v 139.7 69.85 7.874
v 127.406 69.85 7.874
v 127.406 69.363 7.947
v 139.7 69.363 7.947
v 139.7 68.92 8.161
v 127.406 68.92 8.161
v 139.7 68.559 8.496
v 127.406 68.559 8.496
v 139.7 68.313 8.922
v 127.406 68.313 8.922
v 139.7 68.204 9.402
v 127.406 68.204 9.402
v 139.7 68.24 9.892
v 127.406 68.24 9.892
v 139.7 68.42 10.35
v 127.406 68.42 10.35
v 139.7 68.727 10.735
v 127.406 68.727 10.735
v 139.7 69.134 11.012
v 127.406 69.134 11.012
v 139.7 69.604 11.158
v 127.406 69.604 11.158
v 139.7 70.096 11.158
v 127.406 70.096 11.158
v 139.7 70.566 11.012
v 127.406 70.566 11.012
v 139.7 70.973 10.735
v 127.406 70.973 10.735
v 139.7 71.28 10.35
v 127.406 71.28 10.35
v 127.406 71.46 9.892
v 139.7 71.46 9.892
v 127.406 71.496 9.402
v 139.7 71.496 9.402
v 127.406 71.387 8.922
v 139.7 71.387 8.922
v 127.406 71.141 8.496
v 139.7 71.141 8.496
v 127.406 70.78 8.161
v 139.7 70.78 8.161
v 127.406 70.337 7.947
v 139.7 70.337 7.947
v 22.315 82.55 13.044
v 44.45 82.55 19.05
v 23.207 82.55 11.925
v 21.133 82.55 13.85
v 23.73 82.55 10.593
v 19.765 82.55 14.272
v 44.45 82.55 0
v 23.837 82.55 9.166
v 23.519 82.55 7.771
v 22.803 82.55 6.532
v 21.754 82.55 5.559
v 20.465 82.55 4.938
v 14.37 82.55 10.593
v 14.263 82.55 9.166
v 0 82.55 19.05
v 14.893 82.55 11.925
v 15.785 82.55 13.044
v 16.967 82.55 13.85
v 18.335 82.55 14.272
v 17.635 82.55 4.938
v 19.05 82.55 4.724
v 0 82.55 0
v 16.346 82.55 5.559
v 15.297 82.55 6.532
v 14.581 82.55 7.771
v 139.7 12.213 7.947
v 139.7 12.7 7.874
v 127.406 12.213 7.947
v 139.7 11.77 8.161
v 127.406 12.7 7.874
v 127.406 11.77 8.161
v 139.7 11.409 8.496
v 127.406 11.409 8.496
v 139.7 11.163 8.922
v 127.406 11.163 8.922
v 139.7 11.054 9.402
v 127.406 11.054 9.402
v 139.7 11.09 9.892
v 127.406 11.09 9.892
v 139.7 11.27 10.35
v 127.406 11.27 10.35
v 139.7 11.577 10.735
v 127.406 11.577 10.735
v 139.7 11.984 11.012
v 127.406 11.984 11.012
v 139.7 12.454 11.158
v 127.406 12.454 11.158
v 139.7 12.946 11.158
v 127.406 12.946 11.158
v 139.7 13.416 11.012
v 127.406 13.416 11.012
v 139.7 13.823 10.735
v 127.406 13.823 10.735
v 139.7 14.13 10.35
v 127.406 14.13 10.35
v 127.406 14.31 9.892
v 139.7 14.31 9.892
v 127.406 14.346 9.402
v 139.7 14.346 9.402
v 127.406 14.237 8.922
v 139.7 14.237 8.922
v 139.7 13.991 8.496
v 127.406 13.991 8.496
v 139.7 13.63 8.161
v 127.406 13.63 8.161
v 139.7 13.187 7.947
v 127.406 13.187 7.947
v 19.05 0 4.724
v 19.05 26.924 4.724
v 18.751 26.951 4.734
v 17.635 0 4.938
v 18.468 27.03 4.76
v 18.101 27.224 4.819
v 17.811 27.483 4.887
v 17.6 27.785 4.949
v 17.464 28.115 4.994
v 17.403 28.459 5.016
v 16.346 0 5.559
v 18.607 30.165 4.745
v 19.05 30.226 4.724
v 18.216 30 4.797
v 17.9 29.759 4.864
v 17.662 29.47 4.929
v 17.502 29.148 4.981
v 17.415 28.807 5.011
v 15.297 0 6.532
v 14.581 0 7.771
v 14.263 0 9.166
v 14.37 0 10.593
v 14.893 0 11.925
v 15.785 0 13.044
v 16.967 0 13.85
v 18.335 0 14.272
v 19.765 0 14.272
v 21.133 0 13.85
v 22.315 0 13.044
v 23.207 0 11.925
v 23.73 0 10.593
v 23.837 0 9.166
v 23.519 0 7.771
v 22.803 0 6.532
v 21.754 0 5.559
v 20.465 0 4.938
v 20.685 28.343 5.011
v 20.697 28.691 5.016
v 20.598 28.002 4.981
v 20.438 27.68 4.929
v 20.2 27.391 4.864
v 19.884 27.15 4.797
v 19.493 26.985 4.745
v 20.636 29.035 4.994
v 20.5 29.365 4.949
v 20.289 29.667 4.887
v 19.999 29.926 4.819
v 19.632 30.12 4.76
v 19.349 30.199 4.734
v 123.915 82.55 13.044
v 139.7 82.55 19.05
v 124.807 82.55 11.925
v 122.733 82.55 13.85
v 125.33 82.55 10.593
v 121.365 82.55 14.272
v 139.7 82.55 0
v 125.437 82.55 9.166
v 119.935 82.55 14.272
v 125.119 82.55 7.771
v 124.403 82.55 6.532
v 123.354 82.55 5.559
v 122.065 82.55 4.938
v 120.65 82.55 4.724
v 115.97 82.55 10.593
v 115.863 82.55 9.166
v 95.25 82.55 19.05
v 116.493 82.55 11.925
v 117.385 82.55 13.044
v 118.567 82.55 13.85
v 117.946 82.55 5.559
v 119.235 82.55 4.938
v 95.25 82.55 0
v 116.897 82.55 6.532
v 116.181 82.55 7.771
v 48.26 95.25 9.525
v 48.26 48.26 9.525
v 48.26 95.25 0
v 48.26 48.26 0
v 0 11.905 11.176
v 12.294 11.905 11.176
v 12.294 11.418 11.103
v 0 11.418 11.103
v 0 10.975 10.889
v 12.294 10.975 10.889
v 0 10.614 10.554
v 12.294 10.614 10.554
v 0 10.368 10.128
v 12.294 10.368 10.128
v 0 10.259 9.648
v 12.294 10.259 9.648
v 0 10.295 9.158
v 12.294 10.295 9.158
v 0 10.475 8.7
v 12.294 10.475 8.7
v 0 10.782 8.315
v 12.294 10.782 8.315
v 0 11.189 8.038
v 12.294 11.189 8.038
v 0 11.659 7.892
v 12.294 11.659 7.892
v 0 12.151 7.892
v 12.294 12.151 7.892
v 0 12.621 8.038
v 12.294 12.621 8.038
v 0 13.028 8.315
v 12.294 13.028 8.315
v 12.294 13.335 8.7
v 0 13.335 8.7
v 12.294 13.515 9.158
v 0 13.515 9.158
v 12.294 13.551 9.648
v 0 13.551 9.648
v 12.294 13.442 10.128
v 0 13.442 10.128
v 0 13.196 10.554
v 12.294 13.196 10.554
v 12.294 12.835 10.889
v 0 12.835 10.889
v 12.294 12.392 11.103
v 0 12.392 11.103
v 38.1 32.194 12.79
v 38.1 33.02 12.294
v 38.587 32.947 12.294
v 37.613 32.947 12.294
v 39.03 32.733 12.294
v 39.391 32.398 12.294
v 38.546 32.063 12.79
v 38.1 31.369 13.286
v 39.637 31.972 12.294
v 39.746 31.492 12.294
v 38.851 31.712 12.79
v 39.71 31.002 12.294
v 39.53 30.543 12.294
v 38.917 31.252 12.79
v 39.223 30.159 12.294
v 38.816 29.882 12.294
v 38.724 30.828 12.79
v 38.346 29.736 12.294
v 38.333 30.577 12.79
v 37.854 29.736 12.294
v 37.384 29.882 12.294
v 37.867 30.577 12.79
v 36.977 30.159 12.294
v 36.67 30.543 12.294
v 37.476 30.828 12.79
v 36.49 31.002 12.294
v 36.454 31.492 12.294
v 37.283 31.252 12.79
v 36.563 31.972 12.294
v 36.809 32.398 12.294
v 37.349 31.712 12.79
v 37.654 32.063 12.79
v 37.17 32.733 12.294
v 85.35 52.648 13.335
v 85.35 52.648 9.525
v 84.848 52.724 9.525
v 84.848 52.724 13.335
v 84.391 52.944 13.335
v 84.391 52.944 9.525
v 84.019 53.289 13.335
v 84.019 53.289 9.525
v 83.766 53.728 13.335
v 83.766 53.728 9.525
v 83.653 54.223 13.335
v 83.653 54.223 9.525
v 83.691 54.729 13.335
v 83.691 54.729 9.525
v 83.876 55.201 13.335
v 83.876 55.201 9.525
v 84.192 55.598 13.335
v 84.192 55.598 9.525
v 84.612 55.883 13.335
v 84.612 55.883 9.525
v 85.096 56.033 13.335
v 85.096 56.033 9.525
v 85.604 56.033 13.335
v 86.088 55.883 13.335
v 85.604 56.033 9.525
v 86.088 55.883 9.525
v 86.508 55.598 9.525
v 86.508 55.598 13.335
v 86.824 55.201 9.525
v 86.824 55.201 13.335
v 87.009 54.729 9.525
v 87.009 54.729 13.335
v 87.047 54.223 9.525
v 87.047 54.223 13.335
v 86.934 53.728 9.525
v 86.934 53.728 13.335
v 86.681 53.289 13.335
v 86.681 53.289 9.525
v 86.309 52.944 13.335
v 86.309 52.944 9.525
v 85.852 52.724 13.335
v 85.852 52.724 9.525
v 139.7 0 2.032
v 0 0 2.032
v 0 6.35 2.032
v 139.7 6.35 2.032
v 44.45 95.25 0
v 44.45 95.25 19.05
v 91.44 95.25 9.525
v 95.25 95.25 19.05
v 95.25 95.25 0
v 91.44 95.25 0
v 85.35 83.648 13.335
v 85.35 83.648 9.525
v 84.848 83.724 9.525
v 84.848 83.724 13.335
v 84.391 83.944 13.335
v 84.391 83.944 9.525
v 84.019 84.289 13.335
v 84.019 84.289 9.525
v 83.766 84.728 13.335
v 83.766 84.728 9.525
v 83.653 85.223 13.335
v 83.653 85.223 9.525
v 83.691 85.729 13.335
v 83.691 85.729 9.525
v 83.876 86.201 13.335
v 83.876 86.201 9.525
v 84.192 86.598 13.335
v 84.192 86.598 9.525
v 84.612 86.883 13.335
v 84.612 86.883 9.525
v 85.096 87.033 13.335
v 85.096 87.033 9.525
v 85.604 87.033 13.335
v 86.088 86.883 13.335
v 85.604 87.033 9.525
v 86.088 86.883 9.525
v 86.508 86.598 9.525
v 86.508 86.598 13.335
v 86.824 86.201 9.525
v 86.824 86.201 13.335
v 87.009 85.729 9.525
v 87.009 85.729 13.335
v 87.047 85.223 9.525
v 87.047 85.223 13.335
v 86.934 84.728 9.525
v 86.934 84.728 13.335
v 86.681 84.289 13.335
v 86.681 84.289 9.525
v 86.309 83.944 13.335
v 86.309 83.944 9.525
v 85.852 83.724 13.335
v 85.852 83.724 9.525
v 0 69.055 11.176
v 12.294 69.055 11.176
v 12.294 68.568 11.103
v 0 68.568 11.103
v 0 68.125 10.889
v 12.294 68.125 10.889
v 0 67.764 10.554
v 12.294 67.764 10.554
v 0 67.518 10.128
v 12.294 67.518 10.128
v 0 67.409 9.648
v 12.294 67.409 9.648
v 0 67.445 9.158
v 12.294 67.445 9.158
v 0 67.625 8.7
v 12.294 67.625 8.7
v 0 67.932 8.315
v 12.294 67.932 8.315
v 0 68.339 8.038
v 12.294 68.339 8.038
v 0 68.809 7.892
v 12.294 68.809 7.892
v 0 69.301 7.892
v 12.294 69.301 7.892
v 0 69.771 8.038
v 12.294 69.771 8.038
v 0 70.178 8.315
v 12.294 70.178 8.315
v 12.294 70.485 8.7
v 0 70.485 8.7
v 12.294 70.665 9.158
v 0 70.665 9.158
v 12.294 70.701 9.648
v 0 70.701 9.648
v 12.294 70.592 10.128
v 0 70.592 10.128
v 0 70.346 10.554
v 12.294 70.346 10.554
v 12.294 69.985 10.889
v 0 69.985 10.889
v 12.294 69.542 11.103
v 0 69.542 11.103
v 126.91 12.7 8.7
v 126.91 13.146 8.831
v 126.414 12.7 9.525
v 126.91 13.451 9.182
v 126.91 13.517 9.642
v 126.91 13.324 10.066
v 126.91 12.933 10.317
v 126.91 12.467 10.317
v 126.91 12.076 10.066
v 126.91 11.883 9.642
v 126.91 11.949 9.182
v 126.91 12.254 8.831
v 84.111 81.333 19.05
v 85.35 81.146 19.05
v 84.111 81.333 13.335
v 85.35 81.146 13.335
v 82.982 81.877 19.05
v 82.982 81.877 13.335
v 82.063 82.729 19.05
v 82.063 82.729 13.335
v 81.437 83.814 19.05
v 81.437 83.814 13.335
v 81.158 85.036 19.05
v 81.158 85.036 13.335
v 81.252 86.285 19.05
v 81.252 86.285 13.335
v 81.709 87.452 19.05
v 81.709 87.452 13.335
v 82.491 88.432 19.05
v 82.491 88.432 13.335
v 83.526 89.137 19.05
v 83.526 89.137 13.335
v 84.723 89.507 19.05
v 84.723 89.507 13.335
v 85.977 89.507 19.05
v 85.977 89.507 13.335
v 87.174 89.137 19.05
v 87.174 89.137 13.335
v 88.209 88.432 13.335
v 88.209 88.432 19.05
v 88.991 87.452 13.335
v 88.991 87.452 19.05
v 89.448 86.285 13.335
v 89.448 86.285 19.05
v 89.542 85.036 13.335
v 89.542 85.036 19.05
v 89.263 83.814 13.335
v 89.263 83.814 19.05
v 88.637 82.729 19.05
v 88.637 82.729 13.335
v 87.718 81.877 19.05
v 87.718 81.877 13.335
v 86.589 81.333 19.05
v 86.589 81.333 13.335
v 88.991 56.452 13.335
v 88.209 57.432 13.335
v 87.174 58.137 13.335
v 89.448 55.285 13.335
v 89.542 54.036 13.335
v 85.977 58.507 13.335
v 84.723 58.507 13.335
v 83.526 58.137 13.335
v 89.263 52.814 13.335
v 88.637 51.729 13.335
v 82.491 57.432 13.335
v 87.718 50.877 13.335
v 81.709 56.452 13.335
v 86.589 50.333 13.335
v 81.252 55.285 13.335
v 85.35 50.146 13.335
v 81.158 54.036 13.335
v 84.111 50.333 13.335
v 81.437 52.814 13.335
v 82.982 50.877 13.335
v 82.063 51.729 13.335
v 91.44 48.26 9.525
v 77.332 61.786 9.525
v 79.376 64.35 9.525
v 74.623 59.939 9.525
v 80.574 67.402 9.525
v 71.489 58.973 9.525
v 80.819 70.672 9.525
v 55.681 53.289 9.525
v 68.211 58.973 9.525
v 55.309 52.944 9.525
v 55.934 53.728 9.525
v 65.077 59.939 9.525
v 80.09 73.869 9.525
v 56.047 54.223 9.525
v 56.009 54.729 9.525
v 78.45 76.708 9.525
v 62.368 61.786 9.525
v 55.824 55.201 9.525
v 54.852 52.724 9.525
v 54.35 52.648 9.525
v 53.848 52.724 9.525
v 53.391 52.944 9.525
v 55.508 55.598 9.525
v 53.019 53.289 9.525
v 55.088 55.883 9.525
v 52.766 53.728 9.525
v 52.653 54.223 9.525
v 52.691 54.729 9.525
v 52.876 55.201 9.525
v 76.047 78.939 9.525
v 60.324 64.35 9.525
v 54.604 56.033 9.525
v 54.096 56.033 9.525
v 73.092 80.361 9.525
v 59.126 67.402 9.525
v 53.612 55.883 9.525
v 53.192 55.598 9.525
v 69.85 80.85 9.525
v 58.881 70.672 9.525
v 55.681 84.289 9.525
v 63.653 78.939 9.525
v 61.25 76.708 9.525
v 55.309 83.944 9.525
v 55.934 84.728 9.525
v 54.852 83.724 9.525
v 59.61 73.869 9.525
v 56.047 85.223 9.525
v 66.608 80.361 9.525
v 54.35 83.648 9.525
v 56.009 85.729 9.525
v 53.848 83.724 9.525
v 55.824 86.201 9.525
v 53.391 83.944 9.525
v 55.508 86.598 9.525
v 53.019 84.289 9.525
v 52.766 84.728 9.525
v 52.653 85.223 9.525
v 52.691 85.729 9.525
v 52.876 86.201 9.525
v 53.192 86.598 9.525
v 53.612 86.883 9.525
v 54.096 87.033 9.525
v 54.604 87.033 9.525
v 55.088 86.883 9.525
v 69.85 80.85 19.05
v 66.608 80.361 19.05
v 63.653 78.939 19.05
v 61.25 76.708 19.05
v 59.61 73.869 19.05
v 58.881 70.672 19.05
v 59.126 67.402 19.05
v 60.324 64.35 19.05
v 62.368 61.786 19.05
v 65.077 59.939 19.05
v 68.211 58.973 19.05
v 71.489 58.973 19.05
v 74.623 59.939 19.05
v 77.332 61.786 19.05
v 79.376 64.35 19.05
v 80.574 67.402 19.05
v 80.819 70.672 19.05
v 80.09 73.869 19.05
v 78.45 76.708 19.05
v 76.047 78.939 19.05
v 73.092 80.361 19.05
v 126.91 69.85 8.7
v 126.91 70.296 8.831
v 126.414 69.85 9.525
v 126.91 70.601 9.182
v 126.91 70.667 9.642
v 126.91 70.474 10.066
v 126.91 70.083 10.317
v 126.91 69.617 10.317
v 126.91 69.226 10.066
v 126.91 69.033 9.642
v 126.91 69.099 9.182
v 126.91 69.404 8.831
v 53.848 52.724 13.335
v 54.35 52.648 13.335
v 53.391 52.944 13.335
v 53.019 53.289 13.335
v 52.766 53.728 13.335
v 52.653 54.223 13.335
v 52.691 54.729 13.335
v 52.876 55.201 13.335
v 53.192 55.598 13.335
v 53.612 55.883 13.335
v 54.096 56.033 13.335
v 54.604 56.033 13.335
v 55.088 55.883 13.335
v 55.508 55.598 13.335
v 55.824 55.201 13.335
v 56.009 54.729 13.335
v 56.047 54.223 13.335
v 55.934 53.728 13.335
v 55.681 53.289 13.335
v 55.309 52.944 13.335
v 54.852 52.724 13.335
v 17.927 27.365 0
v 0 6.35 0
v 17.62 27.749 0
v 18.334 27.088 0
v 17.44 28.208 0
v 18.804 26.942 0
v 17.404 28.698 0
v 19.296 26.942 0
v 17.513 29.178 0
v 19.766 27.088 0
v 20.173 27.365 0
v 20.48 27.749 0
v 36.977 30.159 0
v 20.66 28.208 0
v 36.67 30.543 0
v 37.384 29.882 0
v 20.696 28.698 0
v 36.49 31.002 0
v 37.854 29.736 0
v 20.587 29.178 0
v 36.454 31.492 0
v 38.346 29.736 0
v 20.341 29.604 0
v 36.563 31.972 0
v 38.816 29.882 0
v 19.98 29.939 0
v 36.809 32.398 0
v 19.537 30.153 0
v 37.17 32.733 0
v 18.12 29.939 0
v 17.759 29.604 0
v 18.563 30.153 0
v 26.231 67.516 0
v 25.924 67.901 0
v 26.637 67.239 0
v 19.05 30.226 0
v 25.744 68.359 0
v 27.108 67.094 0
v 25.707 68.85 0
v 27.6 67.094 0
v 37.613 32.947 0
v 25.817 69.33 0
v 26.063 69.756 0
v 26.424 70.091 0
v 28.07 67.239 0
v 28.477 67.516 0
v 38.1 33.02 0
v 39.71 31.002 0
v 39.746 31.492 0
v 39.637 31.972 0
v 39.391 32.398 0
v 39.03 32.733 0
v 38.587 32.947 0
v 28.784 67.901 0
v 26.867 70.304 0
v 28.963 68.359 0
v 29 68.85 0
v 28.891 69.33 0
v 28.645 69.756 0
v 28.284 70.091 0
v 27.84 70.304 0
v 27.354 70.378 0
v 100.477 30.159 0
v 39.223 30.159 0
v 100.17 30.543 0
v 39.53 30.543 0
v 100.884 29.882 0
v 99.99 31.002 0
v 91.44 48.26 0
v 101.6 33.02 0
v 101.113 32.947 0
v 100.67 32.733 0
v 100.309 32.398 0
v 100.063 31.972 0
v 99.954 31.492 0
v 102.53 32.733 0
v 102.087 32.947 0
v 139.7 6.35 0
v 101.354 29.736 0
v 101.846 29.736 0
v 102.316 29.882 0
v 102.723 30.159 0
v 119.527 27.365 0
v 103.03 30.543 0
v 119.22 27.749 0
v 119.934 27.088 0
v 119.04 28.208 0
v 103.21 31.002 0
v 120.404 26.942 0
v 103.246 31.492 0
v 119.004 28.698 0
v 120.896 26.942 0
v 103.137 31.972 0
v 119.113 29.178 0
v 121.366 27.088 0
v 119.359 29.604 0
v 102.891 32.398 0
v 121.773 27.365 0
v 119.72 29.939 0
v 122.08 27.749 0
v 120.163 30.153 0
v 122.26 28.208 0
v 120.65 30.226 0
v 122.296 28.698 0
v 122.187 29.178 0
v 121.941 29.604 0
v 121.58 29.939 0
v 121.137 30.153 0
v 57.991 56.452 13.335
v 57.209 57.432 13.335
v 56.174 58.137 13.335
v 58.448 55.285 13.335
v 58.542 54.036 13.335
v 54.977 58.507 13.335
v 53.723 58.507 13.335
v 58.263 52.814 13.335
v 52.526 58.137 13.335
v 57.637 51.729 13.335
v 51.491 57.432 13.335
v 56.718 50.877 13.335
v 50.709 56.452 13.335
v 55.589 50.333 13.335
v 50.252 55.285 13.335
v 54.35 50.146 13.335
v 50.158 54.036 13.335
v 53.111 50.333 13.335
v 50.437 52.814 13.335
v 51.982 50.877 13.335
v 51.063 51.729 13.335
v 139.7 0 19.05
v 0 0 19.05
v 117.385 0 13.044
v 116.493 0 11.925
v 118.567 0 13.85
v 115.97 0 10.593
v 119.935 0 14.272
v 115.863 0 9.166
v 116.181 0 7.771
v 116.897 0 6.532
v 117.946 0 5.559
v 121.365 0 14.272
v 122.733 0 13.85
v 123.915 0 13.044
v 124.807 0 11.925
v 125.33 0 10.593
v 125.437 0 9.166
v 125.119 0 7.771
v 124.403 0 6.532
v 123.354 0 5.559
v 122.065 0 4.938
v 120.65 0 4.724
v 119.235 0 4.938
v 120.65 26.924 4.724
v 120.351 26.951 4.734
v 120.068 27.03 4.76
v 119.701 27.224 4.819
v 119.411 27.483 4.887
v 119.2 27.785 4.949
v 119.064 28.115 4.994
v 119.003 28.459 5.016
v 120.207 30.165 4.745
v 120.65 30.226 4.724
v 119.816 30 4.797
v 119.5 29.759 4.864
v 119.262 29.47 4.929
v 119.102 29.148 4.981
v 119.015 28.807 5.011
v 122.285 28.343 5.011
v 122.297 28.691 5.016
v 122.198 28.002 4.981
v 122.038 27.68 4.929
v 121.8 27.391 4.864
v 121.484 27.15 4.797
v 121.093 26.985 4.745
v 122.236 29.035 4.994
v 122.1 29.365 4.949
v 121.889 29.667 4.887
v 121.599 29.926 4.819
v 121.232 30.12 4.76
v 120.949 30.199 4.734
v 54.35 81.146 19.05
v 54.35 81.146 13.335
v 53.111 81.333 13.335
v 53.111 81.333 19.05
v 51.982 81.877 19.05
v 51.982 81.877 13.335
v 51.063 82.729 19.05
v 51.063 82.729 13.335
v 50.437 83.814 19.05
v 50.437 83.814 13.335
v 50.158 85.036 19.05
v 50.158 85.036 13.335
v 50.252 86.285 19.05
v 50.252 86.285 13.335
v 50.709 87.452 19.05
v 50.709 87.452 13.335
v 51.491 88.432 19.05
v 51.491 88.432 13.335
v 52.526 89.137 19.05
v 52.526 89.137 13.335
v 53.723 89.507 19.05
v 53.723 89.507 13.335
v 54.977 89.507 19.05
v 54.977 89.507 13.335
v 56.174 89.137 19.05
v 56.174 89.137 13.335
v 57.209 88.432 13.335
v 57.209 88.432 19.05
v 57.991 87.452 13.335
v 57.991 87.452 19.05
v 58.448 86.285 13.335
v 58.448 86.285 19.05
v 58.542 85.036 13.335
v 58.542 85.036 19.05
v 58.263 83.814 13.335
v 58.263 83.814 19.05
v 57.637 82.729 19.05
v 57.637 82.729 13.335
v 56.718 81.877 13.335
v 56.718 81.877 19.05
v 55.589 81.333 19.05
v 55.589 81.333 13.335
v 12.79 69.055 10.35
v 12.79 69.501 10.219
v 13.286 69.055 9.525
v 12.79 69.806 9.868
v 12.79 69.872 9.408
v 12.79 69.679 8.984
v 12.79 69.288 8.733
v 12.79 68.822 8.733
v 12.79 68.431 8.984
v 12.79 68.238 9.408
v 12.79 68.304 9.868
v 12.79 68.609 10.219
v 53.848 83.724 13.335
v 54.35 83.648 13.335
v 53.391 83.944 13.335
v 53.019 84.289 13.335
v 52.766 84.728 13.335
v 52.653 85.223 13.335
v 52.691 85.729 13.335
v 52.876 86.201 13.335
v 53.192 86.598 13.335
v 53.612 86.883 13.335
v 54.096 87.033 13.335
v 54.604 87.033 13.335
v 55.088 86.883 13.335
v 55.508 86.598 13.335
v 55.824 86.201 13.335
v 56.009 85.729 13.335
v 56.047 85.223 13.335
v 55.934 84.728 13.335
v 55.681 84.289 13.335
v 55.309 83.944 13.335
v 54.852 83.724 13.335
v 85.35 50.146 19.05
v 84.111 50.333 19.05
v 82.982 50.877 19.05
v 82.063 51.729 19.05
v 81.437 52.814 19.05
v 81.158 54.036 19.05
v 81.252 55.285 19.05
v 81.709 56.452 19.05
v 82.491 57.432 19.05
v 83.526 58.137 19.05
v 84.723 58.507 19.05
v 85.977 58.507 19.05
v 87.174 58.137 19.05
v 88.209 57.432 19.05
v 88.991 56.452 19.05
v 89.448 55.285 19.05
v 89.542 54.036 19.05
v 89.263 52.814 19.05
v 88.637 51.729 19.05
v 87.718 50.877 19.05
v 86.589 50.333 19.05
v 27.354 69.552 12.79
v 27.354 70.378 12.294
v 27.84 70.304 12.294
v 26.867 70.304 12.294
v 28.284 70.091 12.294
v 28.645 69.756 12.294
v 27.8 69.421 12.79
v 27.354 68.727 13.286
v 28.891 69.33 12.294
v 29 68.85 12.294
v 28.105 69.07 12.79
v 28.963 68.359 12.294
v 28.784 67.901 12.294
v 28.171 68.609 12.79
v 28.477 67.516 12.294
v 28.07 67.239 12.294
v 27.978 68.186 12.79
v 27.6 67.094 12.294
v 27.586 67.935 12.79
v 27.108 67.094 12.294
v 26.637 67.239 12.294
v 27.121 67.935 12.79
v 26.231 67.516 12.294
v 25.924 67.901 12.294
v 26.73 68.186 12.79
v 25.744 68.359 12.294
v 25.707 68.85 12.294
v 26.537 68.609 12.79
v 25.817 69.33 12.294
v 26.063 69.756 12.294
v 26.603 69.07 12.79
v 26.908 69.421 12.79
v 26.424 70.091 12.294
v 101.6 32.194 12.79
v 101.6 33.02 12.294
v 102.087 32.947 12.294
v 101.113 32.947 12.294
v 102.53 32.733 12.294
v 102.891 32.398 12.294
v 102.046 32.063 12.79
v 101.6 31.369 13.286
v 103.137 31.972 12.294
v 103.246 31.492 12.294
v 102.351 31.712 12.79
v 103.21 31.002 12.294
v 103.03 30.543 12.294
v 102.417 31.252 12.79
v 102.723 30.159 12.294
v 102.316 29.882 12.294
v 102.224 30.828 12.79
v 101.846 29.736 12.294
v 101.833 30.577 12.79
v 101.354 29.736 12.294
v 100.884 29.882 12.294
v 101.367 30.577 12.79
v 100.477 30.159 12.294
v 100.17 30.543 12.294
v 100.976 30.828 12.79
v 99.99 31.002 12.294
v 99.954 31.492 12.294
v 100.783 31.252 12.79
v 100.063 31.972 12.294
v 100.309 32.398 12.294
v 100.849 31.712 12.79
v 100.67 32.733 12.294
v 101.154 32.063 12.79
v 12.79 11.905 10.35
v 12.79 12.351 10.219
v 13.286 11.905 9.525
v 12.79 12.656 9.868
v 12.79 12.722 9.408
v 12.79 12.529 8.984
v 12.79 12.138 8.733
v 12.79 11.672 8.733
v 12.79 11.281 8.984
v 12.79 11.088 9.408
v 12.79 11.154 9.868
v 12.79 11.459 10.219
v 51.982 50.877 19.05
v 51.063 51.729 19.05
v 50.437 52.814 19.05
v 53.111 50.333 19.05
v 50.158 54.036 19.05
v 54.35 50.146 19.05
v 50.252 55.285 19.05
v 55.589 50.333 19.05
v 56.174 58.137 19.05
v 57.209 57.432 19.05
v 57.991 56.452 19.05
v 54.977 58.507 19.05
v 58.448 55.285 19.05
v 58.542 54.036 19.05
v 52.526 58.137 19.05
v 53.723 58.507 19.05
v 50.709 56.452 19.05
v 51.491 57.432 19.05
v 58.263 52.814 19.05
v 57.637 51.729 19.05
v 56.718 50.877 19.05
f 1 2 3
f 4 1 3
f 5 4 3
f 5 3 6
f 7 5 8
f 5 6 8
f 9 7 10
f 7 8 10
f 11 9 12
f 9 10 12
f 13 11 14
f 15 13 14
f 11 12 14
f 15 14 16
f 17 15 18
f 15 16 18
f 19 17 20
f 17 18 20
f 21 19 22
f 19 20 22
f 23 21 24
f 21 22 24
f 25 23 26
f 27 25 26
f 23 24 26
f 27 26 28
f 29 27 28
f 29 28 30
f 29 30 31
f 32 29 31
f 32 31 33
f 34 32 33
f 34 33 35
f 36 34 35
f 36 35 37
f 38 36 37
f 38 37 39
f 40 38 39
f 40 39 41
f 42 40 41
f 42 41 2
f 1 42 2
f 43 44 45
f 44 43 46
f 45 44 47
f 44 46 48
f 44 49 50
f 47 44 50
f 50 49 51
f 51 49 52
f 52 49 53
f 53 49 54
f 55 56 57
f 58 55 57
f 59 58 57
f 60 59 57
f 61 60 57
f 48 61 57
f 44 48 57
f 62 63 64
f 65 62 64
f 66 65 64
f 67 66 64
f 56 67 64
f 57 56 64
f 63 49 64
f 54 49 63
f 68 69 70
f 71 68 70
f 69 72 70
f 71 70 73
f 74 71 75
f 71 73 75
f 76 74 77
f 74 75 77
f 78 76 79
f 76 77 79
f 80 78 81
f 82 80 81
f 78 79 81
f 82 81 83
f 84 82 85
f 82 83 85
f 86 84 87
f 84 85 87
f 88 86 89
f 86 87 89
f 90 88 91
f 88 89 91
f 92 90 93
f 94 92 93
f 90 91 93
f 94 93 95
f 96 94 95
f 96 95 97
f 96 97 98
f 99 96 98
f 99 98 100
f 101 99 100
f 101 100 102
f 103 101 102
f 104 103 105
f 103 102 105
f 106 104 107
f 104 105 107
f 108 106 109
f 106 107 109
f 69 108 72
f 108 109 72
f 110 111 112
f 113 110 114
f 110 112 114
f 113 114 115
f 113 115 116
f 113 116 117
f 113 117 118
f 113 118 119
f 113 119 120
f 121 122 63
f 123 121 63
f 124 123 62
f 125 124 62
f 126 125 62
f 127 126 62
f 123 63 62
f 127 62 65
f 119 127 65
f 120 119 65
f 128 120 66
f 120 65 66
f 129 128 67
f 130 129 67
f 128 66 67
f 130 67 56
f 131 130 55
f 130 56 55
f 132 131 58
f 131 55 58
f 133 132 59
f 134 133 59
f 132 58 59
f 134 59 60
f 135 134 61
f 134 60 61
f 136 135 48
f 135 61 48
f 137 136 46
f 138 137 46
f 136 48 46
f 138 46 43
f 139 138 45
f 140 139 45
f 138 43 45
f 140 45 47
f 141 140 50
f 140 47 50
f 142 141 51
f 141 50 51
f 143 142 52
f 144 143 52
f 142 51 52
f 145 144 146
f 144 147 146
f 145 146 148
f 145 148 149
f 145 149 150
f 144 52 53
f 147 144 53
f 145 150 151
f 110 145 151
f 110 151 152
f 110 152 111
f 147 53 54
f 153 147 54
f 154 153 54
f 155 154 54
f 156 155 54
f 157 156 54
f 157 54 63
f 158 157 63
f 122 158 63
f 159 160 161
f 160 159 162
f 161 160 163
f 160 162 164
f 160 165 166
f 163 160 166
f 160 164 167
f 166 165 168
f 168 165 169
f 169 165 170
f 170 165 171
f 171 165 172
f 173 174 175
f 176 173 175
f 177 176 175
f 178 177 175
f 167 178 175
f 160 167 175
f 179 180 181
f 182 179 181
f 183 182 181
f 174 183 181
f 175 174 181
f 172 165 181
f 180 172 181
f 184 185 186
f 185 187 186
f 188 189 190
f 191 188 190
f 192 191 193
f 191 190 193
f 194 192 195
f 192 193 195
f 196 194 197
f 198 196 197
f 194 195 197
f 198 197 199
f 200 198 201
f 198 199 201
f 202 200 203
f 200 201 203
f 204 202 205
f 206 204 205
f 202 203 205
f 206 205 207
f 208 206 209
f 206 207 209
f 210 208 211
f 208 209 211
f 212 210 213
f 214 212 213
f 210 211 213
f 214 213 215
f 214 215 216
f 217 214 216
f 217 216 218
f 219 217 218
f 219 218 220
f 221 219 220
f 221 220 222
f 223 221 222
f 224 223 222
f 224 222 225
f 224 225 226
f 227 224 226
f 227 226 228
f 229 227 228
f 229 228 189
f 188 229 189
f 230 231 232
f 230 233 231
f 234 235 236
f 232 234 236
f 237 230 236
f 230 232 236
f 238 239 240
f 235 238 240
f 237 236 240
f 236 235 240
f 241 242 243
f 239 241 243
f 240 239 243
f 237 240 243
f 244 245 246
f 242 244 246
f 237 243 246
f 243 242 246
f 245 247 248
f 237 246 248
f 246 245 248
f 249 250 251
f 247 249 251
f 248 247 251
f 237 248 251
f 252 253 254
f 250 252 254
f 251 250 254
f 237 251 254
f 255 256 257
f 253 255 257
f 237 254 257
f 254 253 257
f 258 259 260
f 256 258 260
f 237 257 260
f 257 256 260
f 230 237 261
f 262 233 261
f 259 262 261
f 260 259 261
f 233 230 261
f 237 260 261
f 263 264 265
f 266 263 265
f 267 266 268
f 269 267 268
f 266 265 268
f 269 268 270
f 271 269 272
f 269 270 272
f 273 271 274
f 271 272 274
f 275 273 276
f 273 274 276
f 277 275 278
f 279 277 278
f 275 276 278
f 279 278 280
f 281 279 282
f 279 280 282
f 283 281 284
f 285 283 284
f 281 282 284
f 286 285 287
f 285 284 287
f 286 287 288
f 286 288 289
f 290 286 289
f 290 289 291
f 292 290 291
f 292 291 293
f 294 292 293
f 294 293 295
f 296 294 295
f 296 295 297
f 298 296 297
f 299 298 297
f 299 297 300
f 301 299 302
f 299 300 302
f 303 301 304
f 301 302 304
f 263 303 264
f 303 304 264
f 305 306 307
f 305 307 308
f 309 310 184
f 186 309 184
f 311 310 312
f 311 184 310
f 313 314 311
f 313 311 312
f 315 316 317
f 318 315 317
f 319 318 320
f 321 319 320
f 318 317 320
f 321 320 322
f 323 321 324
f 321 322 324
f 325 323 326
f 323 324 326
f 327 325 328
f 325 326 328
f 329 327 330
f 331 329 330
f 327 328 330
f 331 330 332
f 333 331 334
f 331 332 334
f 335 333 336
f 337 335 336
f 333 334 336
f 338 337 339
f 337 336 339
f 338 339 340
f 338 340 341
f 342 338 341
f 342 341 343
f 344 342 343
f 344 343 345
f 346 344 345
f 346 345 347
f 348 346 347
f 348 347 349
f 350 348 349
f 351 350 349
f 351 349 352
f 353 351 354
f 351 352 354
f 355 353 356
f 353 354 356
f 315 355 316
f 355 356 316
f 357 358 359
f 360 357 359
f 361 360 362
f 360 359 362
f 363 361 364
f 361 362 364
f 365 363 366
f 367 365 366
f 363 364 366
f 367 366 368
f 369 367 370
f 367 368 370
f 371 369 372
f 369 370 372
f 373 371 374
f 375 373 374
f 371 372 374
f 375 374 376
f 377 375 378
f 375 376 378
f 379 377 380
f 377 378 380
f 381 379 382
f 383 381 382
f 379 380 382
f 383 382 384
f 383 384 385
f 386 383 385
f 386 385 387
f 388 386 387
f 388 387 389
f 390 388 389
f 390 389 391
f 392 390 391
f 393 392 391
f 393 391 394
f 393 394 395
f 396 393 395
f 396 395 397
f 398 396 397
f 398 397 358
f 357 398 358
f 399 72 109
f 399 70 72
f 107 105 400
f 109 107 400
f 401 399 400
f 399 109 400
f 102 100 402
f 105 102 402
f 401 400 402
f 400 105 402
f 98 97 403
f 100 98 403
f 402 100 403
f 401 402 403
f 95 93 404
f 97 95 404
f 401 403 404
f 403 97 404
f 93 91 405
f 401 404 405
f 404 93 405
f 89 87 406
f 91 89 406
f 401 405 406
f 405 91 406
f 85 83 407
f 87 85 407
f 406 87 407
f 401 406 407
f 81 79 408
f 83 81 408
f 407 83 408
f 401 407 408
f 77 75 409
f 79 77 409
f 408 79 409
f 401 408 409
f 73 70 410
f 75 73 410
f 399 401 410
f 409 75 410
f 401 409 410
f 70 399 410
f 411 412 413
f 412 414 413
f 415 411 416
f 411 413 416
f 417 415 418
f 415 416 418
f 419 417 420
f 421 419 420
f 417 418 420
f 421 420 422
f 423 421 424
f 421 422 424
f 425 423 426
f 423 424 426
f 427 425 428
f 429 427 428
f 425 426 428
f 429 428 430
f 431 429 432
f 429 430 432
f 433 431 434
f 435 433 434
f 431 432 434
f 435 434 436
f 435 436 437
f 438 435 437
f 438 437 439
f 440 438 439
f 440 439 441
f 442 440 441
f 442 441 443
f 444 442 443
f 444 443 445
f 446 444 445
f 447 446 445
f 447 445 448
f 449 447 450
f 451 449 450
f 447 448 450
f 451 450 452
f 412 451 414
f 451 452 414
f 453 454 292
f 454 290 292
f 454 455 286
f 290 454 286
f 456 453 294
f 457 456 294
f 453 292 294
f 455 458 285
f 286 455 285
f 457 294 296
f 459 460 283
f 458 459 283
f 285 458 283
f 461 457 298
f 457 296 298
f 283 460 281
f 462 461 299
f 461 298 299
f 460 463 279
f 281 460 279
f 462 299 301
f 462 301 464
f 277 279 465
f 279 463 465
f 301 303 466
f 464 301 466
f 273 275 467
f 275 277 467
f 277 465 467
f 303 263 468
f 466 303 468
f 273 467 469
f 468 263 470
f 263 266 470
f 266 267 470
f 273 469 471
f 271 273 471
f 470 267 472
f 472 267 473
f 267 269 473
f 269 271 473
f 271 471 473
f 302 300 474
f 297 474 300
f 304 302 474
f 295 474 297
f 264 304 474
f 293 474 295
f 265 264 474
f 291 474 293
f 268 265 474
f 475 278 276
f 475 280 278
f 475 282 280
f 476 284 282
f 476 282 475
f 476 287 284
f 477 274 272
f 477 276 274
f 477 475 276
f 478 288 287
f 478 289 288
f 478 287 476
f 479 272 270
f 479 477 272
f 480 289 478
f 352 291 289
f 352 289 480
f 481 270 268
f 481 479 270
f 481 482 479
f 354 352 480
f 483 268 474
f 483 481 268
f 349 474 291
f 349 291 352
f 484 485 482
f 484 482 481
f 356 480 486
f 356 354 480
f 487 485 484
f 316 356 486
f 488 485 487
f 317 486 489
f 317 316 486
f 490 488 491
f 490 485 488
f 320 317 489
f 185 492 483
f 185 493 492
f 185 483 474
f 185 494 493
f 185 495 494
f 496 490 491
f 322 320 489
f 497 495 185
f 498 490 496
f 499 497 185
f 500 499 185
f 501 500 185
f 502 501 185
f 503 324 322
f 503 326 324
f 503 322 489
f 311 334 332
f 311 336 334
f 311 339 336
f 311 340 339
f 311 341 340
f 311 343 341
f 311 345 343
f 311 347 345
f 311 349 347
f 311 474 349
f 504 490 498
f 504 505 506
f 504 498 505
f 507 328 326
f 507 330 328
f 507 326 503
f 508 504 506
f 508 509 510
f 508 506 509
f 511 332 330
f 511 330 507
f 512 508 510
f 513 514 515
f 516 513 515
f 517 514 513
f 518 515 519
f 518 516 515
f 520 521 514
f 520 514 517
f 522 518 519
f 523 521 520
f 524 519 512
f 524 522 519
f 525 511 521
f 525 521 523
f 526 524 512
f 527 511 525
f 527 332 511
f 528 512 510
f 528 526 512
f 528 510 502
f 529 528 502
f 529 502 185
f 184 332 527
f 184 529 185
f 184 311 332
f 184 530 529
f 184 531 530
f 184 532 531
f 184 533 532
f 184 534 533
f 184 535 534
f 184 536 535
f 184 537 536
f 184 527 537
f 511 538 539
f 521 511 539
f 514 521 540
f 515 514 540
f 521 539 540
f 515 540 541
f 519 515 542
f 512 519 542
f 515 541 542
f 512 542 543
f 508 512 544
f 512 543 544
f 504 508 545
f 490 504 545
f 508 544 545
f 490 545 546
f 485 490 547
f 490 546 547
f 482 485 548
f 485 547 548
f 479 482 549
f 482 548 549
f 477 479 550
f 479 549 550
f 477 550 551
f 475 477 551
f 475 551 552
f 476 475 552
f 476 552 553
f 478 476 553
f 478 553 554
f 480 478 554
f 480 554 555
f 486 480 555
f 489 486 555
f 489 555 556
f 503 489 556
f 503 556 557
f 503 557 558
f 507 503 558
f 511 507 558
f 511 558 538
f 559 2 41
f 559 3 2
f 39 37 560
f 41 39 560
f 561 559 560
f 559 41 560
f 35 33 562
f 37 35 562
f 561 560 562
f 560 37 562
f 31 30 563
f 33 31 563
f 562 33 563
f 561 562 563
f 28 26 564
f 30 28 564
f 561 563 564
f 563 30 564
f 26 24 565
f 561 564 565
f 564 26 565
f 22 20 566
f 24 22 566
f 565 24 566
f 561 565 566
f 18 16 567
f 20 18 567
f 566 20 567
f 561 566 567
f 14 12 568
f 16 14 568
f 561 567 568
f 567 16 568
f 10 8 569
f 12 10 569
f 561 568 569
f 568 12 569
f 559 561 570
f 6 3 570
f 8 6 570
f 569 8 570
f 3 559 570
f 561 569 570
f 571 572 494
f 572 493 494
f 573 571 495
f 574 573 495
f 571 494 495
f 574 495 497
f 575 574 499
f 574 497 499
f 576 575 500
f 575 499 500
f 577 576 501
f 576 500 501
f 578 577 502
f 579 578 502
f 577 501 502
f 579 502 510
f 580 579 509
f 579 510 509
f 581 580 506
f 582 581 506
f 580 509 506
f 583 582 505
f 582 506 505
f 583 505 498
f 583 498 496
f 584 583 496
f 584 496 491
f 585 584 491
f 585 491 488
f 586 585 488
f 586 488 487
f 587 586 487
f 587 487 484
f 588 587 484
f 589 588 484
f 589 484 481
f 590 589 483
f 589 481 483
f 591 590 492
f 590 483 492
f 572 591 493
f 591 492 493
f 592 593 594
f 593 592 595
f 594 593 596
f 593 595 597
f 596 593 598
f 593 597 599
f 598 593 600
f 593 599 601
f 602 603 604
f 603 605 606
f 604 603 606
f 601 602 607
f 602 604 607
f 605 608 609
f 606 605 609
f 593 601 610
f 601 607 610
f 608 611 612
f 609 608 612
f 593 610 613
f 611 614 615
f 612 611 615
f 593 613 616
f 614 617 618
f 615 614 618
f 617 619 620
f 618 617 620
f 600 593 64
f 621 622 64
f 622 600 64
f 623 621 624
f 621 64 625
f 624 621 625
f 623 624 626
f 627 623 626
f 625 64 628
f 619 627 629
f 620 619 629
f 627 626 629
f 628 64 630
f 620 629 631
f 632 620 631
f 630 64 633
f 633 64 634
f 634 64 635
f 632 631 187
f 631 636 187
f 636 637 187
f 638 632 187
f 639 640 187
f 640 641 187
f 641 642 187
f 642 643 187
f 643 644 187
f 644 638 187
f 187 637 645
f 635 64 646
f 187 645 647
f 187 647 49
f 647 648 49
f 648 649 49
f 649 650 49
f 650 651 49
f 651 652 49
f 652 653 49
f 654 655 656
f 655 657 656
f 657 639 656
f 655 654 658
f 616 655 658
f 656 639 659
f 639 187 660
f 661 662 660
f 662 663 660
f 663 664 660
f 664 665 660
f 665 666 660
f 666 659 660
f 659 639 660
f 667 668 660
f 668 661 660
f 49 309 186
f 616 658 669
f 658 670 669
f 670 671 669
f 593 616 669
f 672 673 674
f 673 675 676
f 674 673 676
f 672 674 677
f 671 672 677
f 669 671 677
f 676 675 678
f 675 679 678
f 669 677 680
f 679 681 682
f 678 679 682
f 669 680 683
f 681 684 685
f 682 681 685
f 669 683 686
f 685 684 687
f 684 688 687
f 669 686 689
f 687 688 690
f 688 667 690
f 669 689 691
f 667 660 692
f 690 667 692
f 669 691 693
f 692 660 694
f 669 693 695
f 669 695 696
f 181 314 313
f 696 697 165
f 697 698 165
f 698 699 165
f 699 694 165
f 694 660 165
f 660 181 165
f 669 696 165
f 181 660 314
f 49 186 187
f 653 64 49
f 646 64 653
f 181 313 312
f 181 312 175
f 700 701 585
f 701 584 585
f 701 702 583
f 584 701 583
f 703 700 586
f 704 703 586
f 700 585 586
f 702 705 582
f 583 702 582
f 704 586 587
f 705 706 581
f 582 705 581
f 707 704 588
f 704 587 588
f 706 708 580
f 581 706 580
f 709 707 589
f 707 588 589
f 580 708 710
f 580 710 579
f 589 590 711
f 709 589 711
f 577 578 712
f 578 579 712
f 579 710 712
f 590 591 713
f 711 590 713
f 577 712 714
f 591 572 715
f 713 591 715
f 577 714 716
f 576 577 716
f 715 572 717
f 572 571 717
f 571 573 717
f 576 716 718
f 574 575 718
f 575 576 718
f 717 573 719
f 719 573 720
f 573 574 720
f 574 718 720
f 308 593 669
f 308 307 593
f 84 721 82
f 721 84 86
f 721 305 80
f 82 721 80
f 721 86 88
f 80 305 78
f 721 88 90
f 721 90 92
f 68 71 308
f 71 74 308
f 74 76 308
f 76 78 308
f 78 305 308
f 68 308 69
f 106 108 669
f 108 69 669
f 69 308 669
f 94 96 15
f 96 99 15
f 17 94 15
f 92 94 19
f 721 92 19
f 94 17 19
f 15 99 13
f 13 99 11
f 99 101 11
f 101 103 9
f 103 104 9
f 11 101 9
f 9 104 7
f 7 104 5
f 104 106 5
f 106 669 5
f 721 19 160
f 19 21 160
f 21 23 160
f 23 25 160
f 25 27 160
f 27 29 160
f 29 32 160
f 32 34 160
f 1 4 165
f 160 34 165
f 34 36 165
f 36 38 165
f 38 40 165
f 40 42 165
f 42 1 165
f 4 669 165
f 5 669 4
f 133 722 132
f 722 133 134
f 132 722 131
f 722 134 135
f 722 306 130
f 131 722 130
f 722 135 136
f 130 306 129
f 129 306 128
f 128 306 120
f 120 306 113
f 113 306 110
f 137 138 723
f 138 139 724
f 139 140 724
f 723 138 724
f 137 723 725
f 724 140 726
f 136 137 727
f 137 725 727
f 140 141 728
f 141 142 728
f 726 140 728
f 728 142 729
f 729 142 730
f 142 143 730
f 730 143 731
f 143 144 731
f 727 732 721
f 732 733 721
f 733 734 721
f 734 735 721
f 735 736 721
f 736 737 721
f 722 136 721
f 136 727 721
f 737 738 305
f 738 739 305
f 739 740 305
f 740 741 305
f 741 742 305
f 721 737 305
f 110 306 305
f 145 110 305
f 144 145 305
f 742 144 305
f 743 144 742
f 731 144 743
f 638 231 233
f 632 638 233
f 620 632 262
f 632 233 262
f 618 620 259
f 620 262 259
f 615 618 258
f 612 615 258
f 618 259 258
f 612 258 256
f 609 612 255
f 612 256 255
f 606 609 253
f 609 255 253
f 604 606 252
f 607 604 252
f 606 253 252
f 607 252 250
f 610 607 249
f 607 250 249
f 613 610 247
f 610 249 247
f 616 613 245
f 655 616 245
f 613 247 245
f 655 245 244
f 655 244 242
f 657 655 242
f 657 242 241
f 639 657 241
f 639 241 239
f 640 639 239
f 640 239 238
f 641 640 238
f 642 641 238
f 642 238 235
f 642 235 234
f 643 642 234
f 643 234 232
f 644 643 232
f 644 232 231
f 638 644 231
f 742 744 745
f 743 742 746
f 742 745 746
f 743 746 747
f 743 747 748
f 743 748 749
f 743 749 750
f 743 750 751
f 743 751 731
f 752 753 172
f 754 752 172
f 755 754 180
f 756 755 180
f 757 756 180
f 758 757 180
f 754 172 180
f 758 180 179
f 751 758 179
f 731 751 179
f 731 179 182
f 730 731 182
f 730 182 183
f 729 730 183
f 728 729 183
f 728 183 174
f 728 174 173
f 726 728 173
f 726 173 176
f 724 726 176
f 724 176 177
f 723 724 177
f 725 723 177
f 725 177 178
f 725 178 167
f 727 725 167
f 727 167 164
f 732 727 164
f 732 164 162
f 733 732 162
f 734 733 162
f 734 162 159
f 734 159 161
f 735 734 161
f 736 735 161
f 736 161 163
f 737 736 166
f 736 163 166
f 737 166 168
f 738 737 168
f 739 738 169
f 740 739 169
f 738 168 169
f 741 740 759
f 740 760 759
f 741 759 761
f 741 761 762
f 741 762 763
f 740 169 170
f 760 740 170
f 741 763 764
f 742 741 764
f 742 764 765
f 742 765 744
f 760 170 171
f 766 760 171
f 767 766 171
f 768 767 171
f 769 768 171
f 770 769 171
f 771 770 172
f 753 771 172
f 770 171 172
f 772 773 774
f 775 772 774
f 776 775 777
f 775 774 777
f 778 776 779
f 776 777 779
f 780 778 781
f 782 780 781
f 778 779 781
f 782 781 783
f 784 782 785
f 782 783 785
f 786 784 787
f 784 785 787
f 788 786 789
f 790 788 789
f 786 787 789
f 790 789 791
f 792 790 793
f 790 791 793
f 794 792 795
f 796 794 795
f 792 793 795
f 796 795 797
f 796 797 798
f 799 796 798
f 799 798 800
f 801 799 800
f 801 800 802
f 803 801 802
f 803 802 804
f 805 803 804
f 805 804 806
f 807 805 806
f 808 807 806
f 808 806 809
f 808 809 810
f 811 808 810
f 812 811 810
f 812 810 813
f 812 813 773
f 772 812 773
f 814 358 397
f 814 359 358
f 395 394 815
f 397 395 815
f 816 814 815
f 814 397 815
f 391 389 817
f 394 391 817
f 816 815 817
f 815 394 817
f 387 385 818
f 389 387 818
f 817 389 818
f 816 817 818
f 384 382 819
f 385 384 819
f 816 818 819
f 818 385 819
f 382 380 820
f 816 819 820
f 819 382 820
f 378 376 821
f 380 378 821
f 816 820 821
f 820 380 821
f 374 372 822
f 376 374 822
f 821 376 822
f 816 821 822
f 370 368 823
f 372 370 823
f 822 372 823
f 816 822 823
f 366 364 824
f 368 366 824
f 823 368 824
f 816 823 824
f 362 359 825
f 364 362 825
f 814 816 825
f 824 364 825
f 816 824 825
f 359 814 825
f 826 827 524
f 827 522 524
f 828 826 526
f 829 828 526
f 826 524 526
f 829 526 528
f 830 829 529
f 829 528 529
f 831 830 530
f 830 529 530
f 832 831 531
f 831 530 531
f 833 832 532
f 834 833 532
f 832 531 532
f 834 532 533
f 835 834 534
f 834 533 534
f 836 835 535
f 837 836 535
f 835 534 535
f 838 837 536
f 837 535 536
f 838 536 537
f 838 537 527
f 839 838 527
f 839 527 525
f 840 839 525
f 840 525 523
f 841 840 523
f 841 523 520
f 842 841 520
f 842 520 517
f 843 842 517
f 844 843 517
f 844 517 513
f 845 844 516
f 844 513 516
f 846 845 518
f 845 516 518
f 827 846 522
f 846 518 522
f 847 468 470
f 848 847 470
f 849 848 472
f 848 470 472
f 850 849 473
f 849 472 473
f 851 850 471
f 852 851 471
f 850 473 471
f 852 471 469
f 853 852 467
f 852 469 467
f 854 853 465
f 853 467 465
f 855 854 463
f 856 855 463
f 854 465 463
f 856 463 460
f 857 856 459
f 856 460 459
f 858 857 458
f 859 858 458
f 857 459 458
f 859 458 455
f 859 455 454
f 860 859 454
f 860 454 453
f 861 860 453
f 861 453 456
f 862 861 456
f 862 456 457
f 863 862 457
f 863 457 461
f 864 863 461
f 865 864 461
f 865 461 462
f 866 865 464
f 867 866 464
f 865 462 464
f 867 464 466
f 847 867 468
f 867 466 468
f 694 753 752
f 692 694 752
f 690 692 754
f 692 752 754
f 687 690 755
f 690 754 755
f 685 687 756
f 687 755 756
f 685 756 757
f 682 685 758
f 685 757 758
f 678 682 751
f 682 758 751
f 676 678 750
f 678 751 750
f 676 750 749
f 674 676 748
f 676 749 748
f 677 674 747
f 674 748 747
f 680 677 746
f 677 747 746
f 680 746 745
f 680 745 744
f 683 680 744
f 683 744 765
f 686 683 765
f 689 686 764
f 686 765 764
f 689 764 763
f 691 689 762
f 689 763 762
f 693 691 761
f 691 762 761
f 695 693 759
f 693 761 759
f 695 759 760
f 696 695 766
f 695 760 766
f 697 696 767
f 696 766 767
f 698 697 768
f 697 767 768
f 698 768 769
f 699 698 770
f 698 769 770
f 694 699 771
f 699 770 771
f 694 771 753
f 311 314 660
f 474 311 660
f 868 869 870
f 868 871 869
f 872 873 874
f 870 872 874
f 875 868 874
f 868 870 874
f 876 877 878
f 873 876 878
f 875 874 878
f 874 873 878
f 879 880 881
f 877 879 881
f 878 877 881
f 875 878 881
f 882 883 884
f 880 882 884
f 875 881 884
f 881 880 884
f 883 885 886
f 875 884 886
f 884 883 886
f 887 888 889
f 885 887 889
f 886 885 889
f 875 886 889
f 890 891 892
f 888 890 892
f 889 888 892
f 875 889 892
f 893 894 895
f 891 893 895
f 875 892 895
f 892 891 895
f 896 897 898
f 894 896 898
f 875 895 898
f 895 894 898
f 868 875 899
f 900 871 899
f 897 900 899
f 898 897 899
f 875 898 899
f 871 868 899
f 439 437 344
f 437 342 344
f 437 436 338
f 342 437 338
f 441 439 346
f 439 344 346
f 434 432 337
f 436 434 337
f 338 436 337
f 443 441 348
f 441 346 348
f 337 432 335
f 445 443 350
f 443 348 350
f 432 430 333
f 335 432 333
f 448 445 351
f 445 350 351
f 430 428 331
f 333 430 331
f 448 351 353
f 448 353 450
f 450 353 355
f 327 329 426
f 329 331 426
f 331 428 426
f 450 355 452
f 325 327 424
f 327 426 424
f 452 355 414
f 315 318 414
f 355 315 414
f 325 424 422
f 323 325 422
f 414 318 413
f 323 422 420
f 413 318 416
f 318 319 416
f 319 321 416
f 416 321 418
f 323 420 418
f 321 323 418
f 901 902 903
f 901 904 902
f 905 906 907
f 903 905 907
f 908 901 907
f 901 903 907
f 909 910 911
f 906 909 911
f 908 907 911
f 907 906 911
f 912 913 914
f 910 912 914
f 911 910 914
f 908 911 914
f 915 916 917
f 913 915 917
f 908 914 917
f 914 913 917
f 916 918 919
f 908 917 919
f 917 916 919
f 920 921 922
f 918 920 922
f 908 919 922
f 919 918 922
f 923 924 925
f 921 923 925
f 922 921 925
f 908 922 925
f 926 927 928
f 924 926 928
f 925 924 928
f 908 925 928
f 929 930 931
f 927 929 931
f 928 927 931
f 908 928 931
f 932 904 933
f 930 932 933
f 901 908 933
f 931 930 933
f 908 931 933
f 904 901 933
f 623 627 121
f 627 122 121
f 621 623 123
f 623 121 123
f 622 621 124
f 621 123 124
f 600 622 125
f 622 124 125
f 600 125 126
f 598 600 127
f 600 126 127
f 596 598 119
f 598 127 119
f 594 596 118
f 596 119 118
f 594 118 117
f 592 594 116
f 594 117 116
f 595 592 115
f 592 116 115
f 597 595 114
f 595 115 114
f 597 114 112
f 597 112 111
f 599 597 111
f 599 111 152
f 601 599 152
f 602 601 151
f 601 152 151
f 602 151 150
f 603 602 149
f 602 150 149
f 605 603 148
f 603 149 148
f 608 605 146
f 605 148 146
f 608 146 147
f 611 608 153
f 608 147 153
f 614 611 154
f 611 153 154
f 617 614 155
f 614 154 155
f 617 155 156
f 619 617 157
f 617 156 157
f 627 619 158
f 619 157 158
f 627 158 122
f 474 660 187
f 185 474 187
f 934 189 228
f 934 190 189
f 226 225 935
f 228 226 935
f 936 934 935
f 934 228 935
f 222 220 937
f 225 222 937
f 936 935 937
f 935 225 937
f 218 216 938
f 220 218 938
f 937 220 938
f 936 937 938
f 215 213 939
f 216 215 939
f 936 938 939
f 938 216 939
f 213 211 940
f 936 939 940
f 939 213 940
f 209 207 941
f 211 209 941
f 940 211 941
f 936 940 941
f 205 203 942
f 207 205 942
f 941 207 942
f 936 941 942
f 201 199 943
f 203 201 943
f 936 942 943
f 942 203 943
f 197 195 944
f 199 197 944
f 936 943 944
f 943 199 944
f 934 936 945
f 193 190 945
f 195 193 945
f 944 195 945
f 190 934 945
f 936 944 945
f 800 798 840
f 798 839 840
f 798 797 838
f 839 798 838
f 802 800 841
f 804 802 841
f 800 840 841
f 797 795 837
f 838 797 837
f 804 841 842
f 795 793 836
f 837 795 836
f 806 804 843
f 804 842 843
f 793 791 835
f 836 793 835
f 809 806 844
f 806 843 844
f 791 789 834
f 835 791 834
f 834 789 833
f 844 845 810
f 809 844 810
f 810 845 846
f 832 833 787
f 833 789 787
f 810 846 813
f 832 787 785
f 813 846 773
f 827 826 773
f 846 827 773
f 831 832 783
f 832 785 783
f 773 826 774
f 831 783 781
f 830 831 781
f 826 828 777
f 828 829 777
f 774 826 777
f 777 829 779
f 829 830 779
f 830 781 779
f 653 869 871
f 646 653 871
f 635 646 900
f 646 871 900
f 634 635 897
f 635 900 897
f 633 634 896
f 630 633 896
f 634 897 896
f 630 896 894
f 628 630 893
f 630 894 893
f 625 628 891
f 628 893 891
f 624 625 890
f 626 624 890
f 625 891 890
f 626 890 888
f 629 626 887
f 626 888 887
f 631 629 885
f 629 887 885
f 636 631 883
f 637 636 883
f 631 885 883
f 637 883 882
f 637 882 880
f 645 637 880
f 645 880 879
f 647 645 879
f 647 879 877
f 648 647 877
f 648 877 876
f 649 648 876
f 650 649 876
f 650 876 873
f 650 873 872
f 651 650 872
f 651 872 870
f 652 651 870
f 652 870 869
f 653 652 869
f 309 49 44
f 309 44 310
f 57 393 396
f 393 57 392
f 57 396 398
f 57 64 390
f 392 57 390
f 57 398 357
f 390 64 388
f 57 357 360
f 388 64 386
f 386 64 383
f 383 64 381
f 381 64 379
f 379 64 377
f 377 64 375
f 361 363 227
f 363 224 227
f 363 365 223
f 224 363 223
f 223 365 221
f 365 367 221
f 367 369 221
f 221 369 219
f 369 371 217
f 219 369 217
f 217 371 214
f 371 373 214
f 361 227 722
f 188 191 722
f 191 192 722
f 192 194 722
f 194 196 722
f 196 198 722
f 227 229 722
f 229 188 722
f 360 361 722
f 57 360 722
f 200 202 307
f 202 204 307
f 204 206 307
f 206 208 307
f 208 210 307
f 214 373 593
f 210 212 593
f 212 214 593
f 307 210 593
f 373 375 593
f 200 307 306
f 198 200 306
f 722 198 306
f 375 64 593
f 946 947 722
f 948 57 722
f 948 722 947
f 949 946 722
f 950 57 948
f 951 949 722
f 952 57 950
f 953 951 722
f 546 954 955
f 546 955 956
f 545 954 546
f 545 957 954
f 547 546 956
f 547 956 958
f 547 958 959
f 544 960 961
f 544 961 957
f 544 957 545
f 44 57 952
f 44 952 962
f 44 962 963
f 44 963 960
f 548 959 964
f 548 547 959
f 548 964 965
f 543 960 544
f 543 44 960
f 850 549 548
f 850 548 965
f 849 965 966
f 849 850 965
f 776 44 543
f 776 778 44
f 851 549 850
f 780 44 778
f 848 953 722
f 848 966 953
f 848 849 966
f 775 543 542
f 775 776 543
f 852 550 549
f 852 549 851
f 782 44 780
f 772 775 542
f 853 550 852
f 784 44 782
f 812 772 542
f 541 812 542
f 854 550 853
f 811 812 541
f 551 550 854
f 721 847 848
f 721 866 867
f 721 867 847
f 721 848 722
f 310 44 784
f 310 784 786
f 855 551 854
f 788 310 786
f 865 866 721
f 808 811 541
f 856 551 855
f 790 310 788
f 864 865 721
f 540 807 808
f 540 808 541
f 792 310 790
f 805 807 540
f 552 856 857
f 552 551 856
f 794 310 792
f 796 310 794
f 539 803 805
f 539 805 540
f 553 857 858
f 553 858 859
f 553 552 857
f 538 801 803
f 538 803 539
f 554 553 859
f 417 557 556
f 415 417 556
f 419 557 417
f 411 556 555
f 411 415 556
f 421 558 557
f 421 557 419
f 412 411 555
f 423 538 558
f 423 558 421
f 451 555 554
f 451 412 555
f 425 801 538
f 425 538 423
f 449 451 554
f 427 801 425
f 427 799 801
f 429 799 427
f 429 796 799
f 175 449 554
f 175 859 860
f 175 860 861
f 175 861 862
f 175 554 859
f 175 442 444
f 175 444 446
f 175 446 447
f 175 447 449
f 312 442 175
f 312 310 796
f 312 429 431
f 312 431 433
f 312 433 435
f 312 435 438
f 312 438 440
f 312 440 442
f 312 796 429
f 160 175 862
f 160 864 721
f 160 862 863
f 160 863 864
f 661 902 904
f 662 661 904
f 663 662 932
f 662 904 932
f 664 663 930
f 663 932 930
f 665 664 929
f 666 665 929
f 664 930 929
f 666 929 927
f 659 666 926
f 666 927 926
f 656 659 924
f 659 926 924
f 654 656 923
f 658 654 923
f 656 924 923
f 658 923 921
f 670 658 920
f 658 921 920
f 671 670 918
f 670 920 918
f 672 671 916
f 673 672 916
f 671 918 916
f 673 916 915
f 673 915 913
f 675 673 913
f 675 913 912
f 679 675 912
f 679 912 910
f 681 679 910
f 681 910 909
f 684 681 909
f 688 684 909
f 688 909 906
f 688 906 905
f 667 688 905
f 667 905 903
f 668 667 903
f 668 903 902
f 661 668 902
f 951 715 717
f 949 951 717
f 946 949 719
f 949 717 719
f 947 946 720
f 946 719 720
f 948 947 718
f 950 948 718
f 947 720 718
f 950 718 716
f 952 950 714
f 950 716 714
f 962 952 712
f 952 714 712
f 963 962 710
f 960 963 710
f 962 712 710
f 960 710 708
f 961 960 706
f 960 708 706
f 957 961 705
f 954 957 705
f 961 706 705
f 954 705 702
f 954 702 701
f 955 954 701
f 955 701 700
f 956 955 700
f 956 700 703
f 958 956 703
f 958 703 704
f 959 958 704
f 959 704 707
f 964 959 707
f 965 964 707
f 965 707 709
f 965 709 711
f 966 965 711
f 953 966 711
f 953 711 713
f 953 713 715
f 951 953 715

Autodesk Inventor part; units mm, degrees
ref_plane "YZ Plane" through (0, 0, 0) normal (1, 0, 0) x (0, 1, 0)
ref_plane "XZ Plane" through (0, 0, 0) normal (0, 1, 0) x (-1, 0, 0)
ref_plane "XY Plane" through (0, 0, 0) normal (0, 0, 1) x (1, 0, 0)
sketch "Sketch1" plane through (0, 0, 0) normal (0, 0, 1) x (1, 0, 0)
  line L0 (0, 0) -> (139.7, 0)
  line L1 (139.7, 0) -> (139.7, 82.55)
  line L2 (139.7, 82.55) -> (0, 82.55)
  line L3 (0, 82.55) -> (0, 0)
  line L4 (95.25, 82.55) -> (44.45, 82.55)
  line L5 (44.45, 82.55) -> (44.45, 95.25)
  line L6 (44.45, 95.25) -> (95.25, 95.25)
  line L7 (95.25, 95.25) -> (95.25, 82.55)
  point P0 (69.85, 82.55)
  dimension "d0" = 139.7
  dimension "d1" = 82.55
  dimension "d2" = 12.7
  dimension "d3" = 50.8
  dimension "d4" = 25.4
  dimension "d62" = 69.85
extrude "Extrusion1" add sketch "Sketch1" along normal blind 19.05
sketch "Sketch2" plane through (0, 0, 0) normal (0, 0, -1) x (-1, 0, 0)
  line L0 (-44.45, 82.55) -> (0, 82.55) projected
  line L1 (-139.7, 0) -> (-139.7, 82.55) projected
  point P0 (0, 0)
  point P1 (-69.85, 69.85)
  dimension "d7" = 12.7
  dimension "d8" = 69.85
hole "Hole1" at (69.85, 69.85, 0) direction (0, 0, 1) diameter 22 depth 25.4 tip angle 118
sketch "Sketch3" plane through (0, 0, 0) normal (0, 0, -1) x (-1, 0, 0)
  line L0 (-91.44, 48.26) -> (-48.26, 48.26)
  line L1 (-48.26, 48.26) -> (-48.26, 91.44)
  line L2 (-48.26, 91.44) -> (-91.44, 91.44)
  line L3 (-91.44, 91.44) -> (-91.44, 48.26)
  line L4 (-91.44, 48.26) -> (-48.26, 91.44) construction
  line L5 (-48.26, 48.26) -> (-91.44, 91.44) construction
  line L6 (-44.45, 82.55) -> (0, 82.55) projected
  line L7 (-95.25, 95.25) -> (-44.45, 95.25) projected
  line L8 (-91.44, 91.44) -> (-48.26, 91.44)
  line L9 (-48.26, 91.44) -> (-48.26, 95.25)
  line L10 (-48.26, 95.25) -> (-91.44, 95.25)
  line L11 (-91.44, 95.25) -> (-91.44, 91.44)
  line L12 (-139.7, 0) -> (-139.7, 82.55) projected
  point P0 (0, 0)
  point P1 (-69.85, 69.85)
  dimension "d16" = 12.7
  dimension "d17" = 43.18
  dimension "d18" = 43.18
  dimension "d21" = 69.85
  dimension "d22" = 43.18
extrude "Extrusion2" cut sketch "Sketch3" against normal blind 9.525
sketch "Sketch4" plane through (0, 0, 19.05) normal (0, 0, 1) x (1, 0, 0)
  line L0 (54.35, 54.35) -> (85.35, 54.35)
  line L1 (85.35, 54.35) -> (85.35, 85.35)
  line L2 (85.35, 85.35) -> (54.35, 85.35)
  line L3 (54.35, 85.35) -> (54.35, 54.35)
  line L4 (54.35, 54.35) -> (85.35, 85.35) construction
  line L5 (85.35, 54.35) -> (54.35, 85.35) construction
  line L6 (139.7, 82.55) -> (95.25, 82.55) projected
  line L7 (139.7, 0) -> (139.7, 82.55) projected
  point P0 (0, 0)
  point P1 (69.85, 69.85)
  dimension "d23" = 12.7
  dimension "d24" = 69.85
  dimension "d25" = 31
  dimension "d26" = 31
hole "Hole2" at (54.35, 85.35, 19.05) at (54.35, 54.35, 19.05) at (85.35, 85.35, 19.05) at (85.35, 54.35, 19.05) direction (0, 0, -1) diameter 3.4036 end through all counterbore diameter 8.4074 counterbore depth 5.715 clearance for "Hex Head Machine Screw" size "M3" standard "Ansi Metric M Profile"
sketch "Sketch5" plane through (0, 0, 0) normal (0, -1, 0) x (1, 0, 0)
  line L0 (120.65, 9.525) -> (19.05, 9.525)
  line L1 (0, 0) -> (139.7, 0) projected
  line L2 (139.7, 0) -> (139.7, 19.05) projected
  dimension "d34" = 101.6
  dimension "d35" = 9.525
  dimension "d36" = 19.05
hole "Hole3" at (120.65, 0, 9.525) at (19.05, 0, 9.525) direction (0, 1, 0) diameter 9.6012 end through all
sketch "Sketch6" plane through (0, 0, 0) normal (0, 0, -1) x (-1, 0, 0)
  line L0 (-120.65, 28.575) -> (-19.05, 28.575)
  line L1 (-44.45, 82.55) -> (0, 82.55) projected
  line L2 (0, 82.55) -> (0, 0) projected
  dimension "d44" = 101.6
  dimension "d45" = 53.975
  dimension "d46" = 19.05
hole "Hole4" at (120.65, 28.575, 0) at (19.05, 28.575, 0) direction (0, 0, 1) diameter 3.302 depth 12.2936 tip angle 118 thread size "8-32 UNC" class "2B" standard "ANSI Unified Screw Threads"
sketch "Sketch7" plane through (0, 0, 0) normal (-1, 0, 0) x (0, 0, 1)
  line L0 (9.525, 95.25) -> (9.525, 48.26) projected
  line L1 (9.525, 69.055) -> (9.525, 11.905)
  point P0 (0, 0)
  point P1 (9.525, 89.85)
  dimension "d54" = 57.15
hole "Hole5" at (0, 69.055, 9.525) at (0, 11.905, 9.525) direction (1, 0, 0) diameter 3.302 depth 12.2936 tip angle 118 thread size "8-32 UNC" class "2B" standard "ANSI Unified Screw Threads"
sketch "Sketch8" plane through (139.7, 0, 0) normal (1, 0, 0) x (0, 0, -1)
  line L0 (-19.05, 82.55) -> (-19.05, 0) projected
  line L1 (0, 0) -> (-19.05, 0) projected
  point P0 (-9.525, 12.7)
  point P1 (-9.525, 69.85)
  dimension "d87" = 57.15
  dimension "d88" = 9.525
  dimension "d89" = 9.525
  dimension "d90" = 12.7
sketch "Sketch9" plane through (0, 0, 0) normal (0, 0, -1) x (-1, 0, 0)
  line L0 (-139.7, 41.275) -> (0, 41.275)
  line L1 (0, 0) -> (-139.7, 0) projected
  line L2 (-101.6, 31.369) -> (-38.1, 31.369)
  line L3 (0, 82.55) -> (0, 0) projected
  line L4 (-44.45, 82.55) -> (0, 82.55) projected
  line L5 (0, 82.55) -> (-31.75, 41.275)
  line L6 (-17.1517, 76.4998) -> (-38.7838, 52.9606)
  point P0 (-27.3538, 68.7266)
  dimension "d63" = 41.275
  dimension "d64" = 9.906
  dimension "d65" = 139.7
  dimension "d66" = 0
  dimension "d67" = 31.75
  dimension "d68" = 9.906
  dimension "d69" = 12.7
  dimension "d71" = 63.5
  dimension "d72" = 38.1
  dimension "d101" = 11.43
hole "Hole6" at (27.3538, 68.7266, 0) at (38.1, 31.369, 0) at (101.6, 31.369, 0) direction (0, 0, 1) diameter 3.302 depth 12.2936 tip angle 118 thread size "8-32 UNC" class "2B" standard "ANSI Unified Screw Threads"
hole "Hole8" at (139.7, 12.7, 9.525) at (139.7, 69.85, 9.525) direction (-1, 0, 0) diameter 3.302 depth 12.2936 tip angle 118 thread size "8-32 UNC" class "2B" standard "ANSI Unified Screw Threads"
sketch "Sketch10" plane through (0, 0, 0) normal (0, -1, 0) x (1, 0, 0)
  point P0 (0, 0)
sketch "Sketch11" plane through (0, 0, 0) normal (0, -1, 0) x (1, 0, 0)
  line L0 (139.7, 0) -> (95.25, 0) projected
  line L1 (0, 0) -> (0, 19.05) projected
  line L2 (139.7, 0) -> (0, 0)
  line L3 (0, 0) -> (0, 2.032)
  line L4 (0, 2.032) -> (139.7, 2.032)
  line L5 (139.7, 2.032) -> (139.7, 0)
  dimension "d98" = 2.032
extrude "Extrusion3" cut sketch "Sketch11" against normal blind 6.35
properties part number "back mount"
